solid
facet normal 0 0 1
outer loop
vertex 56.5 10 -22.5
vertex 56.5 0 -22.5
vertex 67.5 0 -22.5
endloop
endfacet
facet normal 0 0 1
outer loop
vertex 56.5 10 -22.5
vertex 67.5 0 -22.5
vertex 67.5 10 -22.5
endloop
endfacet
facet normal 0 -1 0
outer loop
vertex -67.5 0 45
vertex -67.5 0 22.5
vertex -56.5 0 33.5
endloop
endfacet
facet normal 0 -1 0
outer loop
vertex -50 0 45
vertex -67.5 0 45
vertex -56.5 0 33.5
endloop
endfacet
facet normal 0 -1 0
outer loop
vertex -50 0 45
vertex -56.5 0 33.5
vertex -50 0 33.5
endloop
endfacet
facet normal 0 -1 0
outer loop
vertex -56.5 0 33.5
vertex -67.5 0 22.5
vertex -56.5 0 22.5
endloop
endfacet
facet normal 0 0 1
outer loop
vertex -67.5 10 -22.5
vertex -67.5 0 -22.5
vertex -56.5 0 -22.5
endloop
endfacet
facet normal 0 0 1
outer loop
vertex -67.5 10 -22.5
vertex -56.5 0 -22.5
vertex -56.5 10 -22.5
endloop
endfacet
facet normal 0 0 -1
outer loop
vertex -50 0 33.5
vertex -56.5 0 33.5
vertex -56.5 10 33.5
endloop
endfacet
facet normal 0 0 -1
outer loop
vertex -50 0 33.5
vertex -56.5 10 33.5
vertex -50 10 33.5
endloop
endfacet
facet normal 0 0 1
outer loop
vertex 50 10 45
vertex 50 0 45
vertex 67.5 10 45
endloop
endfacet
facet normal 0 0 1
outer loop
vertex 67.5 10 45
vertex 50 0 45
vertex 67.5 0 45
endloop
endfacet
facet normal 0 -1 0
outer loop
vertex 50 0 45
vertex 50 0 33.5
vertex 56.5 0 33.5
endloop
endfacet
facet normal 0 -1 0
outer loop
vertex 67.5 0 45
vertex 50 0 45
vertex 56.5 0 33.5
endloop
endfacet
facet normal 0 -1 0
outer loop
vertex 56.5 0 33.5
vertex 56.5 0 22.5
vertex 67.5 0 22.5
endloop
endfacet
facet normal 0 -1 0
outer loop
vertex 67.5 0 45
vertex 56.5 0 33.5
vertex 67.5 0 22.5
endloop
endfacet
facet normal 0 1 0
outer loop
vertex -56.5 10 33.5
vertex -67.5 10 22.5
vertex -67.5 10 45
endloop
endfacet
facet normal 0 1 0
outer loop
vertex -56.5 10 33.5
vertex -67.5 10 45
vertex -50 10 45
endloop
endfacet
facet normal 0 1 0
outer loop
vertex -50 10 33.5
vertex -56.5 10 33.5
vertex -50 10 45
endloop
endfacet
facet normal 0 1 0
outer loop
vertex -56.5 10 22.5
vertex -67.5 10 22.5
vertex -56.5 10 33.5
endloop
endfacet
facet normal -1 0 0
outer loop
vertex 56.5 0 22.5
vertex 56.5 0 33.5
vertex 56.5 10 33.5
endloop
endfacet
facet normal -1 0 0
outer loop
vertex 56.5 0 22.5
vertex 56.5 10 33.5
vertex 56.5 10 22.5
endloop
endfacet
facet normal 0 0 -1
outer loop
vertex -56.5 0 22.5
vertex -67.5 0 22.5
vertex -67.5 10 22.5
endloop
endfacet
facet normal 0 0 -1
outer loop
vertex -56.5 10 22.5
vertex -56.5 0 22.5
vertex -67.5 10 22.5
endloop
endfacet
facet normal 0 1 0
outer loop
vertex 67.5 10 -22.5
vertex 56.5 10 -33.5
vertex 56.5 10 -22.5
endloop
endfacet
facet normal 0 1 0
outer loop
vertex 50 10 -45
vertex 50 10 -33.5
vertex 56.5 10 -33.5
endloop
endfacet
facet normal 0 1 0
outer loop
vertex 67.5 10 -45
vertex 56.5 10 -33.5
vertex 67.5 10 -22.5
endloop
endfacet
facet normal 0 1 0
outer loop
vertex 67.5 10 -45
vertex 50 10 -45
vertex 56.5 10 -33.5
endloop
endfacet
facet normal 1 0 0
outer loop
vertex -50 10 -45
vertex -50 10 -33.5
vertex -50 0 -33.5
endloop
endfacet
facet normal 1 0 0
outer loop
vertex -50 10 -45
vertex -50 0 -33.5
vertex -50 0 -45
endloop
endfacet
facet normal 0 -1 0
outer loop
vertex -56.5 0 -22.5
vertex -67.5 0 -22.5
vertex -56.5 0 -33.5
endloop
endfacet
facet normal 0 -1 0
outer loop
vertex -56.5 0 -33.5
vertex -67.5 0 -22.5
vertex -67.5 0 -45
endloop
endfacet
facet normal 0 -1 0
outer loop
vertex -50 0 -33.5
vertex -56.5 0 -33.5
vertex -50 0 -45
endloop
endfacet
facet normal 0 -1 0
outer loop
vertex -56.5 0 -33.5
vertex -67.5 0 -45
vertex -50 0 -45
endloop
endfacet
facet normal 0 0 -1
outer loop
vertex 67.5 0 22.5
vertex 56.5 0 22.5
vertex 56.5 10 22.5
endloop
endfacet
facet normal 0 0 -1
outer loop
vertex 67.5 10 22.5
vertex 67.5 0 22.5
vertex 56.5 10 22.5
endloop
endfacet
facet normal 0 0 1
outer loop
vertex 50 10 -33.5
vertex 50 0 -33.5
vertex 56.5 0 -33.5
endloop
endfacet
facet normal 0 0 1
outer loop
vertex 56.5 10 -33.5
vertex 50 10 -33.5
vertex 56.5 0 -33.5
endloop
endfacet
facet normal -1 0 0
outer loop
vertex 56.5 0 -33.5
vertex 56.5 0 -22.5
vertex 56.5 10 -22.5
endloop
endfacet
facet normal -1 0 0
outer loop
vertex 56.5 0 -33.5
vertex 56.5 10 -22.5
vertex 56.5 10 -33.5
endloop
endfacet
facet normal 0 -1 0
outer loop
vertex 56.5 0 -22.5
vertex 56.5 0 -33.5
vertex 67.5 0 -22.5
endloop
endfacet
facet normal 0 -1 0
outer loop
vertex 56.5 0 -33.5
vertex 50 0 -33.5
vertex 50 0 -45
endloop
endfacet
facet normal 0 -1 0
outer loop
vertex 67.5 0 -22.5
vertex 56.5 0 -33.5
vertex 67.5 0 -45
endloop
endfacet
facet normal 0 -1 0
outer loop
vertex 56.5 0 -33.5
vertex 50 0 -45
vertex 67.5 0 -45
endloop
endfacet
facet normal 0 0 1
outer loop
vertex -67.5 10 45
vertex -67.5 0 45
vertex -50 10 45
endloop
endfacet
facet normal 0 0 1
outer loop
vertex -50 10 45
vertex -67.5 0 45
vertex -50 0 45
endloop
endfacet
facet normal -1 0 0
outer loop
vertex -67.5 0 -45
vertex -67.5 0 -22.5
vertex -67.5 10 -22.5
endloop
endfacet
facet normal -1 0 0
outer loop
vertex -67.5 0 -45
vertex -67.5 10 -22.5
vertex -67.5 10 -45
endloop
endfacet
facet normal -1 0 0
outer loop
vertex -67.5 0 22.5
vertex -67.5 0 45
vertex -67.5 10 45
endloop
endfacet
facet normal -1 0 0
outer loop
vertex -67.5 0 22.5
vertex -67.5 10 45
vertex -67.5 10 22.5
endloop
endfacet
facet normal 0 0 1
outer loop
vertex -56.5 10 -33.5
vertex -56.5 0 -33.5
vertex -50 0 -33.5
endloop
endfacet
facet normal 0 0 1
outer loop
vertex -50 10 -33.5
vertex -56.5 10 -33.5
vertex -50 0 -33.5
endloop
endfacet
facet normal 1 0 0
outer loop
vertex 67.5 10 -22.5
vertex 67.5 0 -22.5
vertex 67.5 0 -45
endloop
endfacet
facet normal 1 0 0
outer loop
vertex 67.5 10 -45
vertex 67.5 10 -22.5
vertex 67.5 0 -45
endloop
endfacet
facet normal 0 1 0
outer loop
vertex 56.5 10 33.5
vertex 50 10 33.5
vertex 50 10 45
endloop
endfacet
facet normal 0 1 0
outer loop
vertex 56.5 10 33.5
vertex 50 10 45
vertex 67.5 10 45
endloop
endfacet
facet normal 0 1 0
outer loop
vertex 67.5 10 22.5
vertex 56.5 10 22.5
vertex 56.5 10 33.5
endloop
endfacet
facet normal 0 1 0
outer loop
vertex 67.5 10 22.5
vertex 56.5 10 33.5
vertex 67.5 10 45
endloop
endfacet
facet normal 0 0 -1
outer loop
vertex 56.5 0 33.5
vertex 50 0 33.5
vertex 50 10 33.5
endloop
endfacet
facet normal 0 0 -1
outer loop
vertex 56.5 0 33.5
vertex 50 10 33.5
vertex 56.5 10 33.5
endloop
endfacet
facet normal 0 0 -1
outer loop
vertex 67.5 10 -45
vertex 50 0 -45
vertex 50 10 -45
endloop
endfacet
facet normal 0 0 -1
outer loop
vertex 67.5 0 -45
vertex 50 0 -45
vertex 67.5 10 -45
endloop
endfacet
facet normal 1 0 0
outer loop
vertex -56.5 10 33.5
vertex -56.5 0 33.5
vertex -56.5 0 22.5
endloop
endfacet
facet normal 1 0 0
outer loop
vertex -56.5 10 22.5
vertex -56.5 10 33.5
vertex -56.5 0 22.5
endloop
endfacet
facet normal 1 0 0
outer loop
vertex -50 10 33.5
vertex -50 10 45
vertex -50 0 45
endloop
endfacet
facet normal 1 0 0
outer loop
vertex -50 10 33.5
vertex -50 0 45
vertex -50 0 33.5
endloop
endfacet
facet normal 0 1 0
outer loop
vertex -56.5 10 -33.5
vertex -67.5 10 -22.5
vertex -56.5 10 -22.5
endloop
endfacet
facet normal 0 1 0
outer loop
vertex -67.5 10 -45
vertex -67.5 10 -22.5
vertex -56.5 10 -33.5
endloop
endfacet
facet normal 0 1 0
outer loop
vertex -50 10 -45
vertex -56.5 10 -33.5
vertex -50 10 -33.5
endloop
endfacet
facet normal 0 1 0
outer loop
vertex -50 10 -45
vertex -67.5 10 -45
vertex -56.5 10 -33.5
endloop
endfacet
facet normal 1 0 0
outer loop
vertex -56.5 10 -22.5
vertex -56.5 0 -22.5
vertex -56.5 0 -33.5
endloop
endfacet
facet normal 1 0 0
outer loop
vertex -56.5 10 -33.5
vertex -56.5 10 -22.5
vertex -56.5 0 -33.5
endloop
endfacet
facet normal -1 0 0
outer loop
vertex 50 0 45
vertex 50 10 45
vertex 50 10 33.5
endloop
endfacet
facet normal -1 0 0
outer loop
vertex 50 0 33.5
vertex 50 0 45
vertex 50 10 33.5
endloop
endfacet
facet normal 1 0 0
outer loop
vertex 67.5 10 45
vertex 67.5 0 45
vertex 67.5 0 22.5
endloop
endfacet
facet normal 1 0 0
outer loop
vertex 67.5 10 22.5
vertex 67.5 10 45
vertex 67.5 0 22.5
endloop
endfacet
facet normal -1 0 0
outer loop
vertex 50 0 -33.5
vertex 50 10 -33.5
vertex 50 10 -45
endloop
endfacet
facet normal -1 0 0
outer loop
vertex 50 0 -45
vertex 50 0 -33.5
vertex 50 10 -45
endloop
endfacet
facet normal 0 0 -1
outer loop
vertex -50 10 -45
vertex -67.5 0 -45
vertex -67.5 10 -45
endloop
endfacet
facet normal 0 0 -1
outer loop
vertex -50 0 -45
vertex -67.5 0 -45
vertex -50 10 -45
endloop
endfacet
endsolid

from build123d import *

# Parameters (mm, degrees)
SKETCH1_W           = 135
SKETCH1_H           = 90
SKETCH1_W_2         = 113
SKETCH1_H_2         = 67
BOSS_EXTRUDE1_DEPTH = 10
SKETCH2_W           = 45
SKETCH2_H           = 35
CUT_EXTRUDE1_DEPTH  = 300
SKETCH3_W           = 100
SKETCH3_H           = 120.605427014
CUT_EXTRUDE2_DEPTH  = 25


with BuildPart() as part:
    # Sketch1 → Boss-Extrude1 (new body)
    with BuildSketch(Plane(origin=(0, 0, 0), x_dir=(1, 0, 0), z_dir=(0, 1, 0))):
        Rectangle(SKETCH1_W, SKETCH1_H)
        Rectangle(SKETCH1_W_2, SKETCH1_H_2, mode=Mode.SUBTRACT)
    extrude(amount=BOSS_EXTRUDE1_DEPTH)

    # Sketch2 → Cut-Extrude1 (cut, symmetric)
    with BuildSketch(Plane.ZY.offset(-56.5)):
        with Locations((0, -2.5)):
            Rectangle(SKETCH2_W, SKETCH2_H)
    extrude(amount=CUT_EXTRUDE1_DEPTH, both=True, mode=Mode.SUBTRACT)

    # Sketch3 → Cut-Extrude2 (cut, symmetric)
    with BuildSketch(Plane(origin=(0, 10, 0), x_dir=(1, 0, 0), z_dir=(0, 1, 0))):
        with Locations((0, -1.453077434)):
            Rectangle(SKETCH3_W, SKETCH3_H)
    extrude(amount=CUT_EXTRUDE2_DEPTH, both=True, mode=Mode.SUBTRACT)


solid = part.part
